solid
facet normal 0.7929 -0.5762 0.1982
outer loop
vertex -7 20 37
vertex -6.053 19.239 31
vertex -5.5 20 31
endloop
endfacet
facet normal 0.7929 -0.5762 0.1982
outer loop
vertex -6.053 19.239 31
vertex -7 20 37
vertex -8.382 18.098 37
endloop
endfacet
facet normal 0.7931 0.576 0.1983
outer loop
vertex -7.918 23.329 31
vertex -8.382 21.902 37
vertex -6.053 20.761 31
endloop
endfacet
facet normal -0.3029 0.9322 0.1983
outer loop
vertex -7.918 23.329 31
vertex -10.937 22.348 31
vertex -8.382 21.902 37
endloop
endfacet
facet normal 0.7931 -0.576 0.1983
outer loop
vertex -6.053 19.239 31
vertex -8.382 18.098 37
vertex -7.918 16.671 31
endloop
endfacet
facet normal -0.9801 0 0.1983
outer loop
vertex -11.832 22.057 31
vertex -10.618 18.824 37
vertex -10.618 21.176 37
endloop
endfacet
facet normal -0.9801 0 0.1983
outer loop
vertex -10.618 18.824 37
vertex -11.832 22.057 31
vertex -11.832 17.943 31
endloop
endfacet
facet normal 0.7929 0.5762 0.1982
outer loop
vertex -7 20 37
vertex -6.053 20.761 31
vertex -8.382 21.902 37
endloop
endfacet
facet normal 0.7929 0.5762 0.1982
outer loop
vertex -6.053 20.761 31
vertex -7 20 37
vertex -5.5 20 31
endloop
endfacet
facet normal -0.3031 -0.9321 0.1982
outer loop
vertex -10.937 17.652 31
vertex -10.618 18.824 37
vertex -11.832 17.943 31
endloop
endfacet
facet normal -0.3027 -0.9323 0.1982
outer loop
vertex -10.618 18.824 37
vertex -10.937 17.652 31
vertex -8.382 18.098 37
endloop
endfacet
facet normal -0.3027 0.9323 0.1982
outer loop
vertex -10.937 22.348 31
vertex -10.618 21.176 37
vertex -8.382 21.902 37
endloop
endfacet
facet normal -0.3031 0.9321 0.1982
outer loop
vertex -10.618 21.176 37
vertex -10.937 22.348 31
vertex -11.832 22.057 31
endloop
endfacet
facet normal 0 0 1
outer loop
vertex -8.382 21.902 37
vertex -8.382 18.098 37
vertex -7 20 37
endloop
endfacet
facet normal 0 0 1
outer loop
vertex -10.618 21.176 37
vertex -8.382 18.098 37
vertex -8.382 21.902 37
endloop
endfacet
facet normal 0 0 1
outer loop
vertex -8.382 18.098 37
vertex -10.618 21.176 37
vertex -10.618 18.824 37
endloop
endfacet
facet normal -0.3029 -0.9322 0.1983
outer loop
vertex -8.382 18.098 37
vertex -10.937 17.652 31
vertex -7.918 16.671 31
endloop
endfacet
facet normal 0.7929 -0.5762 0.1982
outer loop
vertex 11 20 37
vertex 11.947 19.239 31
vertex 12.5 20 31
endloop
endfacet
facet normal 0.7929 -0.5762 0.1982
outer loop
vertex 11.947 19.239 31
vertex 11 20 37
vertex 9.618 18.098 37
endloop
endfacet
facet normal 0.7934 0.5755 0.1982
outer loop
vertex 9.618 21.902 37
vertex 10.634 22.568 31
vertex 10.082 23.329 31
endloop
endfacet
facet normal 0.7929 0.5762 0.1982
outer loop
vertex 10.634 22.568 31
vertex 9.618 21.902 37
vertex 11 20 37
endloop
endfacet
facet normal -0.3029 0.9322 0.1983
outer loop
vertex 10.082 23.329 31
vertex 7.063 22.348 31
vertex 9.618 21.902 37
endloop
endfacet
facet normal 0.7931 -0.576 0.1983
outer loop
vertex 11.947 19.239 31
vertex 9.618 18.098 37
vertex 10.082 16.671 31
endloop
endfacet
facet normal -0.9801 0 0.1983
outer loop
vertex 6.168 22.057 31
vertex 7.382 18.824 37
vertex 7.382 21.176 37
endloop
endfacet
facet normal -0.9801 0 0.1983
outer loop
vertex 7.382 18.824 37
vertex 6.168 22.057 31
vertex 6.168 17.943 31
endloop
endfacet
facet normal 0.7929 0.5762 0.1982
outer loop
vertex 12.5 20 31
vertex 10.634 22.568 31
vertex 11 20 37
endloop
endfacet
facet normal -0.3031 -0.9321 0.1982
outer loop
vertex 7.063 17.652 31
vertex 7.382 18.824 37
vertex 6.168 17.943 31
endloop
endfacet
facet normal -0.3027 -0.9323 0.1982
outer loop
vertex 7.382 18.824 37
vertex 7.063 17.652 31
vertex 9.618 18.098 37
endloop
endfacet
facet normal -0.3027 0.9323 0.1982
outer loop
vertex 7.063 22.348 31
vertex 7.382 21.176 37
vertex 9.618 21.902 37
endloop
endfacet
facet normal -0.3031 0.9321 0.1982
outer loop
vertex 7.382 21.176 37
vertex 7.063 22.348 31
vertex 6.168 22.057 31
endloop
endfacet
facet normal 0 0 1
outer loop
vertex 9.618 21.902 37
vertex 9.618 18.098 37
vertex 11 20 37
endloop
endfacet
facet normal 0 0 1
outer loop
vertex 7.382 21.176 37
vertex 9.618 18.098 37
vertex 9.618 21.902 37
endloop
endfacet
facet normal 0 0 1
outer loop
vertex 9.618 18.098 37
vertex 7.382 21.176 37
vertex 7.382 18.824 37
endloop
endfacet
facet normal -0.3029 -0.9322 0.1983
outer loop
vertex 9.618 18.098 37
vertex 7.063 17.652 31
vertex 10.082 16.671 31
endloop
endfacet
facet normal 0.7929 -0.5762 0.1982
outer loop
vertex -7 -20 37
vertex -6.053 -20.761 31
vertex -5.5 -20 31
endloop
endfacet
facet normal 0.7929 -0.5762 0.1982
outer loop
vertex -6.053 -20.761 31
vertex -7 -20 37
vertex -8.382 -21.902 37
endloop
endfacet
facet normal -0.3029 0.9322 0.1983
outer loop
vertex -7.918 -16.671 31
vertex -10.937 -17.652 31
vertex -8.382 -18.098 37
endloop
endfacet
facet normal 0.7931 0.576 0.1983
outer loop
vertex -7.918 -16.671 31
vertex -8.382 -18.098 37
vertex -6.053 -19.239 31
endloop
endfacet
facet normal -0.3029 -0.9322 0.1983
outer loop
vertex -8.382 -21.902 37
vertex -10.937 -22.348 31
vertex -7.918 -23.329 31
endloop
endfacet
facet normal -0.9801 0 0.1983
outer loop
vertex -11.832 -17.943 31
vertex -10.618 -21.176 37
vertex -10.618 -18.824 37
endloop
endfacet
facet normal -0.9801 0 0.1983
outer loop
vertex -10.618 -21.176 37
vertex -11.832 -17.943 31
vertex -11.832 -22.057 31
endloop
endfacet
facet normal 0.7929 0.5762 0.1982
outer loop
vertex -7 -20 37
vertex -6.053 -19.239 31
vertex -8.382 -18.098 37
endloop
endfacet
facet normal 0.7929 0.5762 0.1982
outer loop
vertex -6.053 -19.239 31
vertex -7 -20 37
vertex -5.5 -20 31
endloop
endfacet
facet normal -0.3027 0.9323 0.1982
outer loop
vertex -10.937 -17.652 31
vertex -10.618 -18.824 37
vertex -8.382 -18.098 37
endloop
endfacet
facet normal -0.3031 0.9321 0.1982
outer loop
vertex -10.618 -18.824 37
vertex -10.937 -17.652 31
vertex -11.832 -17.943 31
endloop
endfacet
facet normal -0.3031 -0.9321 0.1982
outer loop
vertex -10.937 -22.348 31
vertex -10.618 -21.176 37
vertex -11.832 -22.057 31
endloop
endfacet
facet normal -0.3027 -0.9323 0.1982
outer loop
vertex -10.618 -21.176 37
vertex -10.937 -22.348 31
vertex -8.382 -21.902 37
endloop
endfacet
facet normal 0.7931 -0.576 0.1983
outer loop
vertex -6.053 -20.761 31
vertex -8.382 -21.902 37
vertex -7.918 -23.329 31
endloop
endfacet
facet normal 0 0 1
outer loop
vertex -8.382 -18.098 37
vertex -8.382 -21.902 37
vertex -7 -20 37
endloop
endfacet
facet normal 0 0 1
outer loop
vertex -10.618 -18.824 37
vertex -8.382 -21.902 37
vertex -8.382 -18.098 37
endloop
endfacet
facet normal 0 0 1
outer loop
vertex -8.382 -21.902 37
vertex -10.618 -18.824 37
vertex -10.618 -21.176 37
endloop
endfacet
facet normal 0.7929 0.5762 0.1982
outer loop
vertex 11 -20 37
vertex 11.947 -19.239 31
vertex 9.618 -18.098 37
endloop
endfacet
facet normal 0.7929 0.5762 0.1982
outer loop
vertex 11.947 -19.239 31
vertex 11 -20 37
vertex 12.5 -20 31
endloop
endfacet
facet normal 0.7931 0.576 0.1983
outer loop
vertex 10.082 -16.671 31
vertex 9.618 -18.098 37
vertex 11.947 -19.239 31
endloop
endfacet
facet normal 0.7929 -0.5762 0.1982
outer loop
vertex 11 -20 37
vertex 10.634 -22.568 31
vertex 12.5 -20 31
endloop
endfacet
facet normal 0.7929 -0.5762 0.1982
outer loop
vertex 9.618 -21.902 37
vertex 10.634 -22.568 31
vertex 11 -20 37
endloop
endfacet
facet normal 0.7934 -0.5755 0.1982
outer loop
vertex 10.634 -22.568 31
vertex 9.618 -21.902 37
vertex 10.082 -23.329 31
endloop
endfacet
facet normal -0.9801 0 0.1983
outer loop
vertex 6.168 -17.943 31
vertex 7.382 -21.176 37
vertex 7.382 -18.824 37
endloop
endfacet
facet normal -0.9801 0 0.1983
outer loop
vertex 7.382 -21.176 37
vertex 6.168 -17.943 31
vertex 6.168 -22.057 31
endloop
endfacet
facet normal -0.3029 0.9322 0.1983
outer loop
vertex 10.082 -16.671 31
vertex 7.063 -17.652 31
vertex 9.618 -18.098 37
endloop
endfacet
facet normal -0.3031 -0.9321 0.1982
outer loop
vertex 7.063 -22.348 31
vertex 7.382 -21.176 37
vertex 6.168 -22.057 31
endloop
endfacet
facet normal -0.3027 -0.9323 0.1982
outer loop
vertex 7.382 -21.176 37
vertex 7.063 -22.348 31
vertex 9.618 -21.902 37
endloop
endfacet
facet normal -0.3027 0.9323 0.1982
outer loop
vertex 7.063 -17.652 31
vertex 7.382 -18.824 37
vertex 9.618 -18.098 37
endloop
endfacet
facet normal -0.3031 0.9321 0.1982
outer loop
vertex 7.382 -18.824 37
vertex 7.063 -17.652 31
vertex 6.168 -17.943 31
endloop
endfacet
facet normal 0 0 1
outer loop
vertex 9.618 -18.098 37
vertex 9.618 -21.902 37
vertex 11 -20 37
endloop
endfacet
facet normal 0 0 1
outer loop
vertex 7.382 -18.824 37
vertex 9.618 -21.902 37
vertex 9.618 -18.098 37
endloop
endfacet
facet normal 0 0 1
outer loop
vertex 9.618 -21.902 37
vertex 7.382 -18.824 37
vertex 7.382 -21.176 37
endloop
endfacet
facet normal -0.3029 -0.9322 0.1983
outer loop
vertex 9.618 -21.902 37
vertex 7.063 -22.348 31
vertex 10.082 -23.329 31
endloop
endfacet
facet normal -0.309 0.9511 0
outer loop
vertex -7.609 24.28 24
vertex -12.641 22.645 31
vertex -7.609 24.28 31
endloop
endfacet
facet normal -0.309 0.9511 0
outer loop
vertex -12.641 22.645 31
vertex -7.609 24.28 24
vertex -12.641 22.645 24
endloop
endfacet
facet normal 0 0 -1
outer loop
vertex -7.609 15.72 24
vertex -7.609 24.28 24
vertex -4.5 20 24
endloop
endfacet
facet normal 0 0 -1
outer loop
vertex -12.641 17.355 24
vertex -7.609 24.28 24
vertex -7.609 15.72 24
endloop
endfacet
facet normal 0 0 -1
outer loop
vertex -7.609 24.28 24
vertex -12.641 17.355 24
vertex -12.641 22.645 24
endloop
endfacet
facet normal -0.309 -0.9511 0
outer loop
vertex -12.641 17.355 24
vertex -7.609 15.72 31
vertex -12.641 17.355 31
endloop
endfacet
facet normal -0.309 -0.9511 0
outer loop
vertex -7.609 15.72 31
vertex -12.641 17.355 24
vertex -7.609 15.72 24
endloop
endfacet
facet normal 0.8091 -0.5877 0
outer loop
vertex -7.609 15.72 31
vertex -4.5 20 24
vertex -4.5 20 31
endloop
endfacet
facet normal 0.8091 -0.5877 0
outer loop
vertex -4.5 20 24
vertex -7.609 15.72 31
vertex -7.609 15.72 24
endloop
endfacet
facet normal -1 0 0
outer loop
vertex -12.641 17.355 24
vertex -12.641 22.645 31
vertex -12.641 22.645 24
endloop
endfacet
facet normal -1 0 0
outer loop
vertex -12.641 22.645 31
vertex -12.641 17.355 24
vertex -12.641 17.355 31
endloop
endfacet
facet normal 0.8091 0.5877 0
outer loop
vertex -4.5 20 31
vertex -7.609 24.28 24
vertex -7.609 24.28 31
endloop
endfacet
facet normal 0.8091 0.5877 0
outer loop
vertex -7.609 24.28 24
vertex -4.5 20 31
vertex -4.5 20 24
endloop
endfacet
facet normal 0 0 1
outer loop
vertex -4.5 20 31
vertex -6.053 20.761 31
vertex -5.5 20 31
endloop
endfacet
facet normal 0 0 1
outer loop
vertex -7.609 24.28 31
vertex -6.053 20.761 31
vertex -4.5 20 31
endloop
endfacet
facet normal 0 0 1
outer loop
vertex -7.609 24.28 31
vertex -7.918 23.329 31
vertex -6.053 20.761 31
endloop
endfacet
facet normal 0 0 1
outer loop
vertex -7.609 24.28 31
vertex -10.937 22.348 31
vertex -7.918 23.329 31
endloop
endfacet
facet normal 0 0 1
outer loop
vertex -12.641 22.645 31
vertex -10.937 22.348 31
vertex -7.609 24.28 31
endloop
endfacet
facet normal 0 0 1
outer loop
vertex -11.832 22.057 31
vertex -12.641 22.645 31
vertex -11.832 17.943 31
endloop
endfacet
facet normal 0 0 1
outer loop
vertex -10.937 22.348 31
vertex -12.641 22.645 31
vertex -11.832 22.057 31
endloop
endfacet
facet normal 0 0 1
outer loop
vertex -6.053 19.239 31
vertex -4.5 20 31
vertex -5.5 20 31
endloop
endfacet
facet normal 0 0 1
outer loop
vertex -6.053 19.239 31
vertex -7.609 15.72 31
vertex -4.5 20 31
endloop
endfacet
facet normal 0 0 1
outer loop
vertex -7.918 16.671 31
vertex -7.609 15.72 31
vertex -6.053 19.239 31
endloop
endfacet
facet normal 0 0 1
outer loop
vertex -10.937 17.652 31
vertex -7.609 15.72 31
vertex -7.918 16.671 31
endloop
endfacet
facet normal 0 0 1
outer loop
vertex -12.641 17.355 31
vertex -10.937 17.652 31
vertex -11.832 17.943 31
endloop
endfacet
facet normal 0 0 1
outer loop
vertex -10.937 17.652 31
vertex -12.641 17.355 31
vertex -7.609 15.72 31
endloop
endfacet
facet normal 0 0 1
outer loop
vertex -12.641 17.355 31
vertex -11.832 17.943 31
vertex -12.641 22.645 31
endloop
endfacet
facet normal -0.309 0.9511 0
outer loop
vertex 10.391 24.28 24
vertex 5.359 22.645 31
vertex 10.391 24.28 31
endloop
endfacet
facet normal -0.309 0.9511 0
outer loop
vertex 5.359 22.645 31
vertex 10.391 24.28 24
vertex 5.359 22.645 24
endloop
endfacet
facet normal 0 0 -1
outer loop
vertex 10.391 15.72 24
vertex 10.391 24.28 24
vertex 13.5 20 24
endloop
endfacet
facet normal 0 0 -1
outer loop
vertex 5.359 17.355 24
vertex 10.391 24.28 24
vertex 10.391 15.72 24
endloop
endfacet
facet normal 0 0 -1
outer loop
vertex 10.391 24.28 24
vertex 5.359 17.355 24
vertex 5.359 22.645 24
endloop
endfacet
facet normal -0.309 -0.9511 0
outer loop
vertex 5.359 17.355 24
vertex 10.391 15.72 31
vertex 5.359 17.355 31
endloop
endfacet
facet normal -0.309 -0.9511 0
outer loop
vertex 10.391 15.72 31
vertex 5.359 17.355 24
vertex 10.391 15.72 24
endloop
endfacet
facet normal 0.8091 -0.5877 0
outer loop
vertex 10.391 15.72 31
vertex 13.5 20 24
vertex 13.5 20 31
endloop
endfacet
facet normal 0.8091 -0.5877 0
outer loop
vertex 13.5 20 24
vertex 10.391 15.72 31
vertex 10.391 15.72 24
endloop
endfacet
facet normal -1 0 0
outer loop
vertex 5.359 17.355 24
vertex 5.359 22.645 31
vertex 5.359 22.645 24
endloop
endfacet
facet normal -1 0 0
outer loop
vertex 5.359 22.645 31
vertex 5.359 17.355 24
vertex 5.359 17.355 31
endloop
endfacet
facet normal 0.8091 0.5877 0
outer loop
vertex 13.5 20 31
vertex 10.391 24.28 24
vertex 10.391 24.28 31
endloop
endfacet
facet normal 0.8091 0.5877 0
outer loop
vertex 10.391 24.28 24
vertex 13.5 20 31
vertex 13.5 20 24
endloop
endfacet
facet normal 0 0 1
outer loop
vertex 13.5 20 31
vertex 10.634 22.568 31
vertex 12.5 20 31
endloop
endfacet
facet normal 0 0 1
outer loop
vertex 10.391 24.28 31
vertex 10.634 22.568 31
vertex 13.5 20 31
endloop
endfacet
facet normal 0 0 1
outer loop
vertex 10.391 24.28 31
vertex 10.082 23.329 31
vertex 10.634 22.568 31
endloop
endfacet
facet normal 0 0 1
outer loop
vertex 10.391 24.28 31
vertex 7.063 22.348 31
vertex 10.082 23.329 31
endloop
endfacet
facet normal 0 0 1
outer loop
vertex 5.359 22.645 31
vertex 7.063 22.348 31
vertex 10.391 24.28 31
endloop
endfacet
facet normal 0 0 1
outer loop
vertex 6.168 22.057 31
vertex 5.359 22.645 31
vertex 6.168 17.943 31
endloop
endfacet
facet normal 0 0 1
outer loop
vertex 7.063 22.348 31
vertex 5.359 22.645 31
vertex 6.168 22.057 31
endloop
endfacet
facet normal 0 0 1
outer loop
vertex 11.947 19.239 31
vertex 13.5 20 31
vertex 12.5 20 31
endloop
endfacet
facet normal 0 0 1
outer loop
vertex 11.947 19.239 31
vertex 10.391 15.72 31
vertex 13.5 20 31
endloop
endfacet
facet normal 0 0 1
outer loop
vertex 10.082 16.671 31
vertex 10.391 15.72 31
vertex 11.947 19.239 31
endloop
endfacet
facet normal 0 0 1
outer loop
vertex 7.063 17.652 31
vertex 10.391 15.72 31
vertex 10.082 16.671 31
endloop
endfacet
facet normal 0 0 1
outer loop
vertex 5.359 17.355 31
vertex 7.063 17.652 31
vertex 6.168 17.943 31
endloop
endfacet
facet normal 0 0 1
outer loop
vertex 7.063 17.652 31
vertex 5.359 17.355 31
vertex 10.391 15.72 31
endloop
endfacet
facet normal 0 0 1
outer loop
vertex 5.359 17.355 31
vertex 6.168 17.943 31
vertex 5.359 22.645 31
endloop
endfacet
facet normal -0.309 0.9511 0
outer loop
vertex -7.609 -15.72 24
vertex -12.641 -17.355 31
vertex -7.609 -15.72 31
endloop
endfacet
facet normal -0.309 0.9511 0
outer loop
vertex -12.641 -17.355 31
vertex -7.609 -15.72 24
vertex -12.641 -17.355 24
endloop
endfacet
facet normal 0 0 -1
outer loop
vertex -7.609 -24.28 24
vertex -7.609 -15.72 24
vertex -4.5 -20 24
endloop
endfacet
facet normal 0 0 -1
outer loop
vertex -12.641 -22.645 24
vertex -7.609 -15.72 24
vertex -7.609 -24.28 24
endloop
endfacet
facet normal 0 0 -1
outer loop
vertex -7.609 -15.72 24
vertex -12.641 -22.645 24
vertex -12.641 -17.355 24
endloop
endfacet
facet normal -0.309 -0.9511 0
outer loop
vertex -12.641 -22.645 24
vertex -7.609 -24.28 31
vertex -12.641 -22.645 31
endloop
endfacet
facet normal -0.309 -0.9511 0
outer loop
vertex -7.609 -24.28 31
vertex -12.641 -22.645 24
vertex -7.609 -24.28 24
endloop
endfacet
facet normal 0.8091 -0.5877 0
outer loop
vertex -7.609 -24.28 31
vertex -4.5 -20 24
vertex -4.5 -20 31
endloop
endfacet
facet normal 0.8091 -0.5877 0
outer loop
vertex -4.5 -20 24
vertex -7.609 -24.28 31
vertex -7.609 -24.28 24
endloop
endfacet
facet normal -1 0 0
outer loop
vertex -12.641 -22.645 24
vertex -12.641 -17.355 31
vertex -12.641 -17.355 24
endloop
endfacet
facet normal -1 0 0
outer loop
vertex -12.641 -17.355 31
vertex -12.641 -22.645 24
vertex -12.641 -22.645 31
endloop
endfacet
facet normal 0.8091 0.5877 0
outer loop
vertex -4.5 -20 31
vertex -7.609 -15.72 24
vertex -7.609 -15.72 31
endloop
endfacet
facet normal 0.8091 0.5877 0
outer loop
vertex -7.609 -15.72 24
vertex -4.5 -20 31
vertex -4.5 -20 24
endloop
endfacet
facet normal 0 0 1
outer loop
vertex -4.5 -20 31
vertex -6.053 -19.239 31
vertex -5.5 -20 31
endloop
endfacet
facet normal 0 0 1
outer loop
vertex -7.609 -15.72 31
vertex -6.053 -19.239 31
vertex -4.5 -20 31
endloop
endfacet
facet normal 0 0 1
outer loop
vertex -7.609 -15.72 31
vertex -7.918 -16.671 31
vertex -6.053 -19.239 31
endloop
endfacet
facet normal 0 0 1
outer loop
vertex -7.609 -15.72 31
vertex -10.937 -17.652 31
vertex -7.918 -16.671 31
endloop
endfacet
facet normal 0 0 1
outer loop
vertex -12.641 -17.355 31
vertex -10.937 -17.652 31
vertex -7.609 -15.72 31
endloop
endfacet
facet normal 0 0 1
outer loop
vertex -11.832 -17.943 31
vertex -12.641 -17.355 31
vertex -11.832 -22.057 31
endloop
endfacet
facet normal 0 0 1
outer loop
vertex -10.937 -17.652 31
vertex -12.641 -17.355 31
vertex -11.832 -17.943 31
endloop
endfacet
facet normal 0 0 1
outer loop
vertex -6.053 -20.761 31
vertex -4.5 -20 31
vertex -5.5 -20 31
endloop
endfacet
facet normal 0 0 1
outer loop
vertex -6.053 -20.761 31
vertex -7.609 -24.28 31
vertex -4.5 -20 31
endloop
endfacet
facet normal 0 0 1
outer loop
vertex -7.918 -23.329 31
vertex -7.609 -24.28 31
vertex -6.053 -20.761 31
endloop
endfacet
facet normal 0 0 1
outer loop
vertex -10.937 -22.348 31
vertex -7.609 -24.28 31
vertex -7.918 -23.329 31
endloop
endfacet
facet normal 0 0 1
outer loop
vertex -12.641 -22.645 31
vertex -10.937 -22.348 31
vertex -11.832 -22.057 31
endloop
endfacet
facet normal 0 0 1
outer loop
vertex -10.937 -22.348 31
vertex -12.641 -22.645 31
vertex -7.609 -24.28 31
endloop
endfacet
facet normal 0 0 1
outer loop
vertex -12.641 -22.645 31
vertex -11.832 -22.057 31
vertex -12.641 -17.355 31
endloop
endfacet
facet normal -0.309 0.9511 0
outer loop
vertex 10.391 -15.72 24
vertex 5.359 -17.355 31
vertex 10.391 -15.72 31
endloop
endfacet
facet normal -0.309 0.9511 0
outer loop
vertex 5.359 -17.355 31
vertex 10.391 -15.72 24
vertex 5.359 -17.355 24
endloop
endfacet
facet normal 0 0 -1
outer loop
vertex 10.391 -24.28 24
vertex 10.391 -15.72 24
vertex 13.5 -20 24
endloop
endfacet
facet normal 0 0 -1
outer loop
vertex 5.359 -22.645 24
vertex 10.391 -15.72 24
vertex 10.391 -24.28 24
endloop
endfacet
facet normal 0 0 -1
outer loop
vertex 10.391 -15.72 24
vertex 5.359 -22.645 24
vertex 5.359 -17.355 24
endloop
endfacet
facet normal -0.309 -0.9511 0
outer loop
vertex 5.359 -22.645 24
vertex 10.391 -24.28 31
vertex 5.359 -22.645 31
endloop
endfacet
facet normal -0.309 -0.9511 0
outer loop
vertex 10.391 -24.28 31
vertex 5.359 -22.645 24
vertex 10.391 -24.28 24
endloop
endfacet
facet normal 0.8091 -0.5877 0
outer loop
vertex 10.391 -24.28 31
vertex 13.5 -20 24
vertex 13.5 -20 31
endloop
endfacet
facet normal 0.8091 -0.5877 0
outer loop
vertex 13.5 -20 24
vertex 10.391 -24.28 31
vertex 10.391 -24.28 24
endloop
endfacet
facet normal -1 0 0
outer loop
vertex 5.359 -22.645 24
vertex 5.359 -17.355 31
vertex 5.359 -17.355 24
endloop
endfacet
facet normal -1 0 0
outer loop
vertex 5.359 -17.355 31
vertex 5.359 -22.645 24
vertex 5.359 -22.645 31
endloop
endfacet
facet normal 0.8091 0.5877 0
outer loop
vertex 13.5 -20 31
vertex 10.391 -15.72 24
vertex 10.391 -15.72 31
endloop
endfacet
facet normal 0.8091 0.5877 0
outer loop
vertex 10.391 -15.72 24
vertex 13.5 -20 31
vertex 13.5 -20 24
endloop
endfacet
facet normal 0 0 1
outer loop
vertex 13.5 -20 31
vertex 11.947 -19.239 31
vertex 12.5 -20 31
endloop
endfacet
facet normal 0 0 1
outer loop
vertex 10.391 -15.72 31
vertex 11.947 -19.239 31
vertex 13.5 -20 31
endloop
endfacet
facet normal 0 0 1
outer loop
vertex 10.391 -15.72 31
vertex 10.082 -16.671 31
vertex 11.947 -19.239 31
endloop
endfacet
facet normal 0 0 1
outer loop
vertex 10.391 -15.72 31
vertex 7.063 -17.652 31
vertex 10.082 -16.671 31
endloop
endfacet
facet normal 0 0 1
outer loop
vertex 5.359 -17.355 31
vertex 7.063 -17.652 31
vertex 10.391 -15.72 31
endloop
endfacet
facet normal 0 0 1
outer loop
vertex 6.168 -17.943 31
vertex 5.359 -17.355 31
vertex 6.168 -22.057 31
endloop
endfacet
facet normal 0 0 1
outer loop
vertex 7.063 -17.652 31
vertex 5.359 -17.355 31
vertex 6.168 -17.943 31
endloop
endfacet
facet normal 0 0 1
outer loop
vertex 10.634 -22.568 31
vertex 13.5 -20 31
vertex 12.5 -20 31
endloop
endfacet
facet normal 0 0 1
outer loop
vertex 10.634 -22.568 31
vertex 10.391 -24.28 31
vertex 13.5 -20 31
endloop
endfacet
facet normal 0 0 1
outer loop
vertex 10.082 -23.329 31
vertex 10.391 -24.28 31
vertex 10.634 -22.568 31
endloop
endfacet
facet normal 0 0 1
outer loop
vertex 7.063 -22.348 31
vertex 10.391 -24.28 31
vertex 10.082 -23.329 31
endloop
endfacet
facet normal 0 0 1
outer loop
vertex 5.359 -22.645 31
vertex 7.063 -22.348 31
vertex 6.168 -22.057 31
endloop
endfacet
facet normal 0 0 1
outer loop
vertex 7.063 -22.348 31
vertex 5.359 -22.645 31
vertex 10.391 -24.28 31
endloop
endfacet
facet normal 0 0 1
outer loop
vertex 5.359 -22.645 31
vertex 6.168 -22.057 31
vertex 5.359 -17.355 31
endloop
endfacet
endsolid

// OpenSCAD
module total(){translate([-9,-20,-37])cylinder(10,2,4.5, $fn=5);
translate([9,-20,-37])cylinder(10,2,4.5, $fn=5);
translate([-9,20,-37])cylinder(10,2,4.5, $fn=5);
translate([9,20,-37])cylinder(10,2,4.5, $fn=5);

translate([-9,-20,-31])cylinder(7,4.5,4.5, $fn=5);
translate([9,-20,-31])cylinder(7,4.5,4.5, $fn=5);
translate([-9,20,-31])cylinder(7,4.5,4.5, $fn=5);
translate([9,20,-31])cylinder(7,4.5,4.5, $fn=5);
} rotate([180,0,0])total();
